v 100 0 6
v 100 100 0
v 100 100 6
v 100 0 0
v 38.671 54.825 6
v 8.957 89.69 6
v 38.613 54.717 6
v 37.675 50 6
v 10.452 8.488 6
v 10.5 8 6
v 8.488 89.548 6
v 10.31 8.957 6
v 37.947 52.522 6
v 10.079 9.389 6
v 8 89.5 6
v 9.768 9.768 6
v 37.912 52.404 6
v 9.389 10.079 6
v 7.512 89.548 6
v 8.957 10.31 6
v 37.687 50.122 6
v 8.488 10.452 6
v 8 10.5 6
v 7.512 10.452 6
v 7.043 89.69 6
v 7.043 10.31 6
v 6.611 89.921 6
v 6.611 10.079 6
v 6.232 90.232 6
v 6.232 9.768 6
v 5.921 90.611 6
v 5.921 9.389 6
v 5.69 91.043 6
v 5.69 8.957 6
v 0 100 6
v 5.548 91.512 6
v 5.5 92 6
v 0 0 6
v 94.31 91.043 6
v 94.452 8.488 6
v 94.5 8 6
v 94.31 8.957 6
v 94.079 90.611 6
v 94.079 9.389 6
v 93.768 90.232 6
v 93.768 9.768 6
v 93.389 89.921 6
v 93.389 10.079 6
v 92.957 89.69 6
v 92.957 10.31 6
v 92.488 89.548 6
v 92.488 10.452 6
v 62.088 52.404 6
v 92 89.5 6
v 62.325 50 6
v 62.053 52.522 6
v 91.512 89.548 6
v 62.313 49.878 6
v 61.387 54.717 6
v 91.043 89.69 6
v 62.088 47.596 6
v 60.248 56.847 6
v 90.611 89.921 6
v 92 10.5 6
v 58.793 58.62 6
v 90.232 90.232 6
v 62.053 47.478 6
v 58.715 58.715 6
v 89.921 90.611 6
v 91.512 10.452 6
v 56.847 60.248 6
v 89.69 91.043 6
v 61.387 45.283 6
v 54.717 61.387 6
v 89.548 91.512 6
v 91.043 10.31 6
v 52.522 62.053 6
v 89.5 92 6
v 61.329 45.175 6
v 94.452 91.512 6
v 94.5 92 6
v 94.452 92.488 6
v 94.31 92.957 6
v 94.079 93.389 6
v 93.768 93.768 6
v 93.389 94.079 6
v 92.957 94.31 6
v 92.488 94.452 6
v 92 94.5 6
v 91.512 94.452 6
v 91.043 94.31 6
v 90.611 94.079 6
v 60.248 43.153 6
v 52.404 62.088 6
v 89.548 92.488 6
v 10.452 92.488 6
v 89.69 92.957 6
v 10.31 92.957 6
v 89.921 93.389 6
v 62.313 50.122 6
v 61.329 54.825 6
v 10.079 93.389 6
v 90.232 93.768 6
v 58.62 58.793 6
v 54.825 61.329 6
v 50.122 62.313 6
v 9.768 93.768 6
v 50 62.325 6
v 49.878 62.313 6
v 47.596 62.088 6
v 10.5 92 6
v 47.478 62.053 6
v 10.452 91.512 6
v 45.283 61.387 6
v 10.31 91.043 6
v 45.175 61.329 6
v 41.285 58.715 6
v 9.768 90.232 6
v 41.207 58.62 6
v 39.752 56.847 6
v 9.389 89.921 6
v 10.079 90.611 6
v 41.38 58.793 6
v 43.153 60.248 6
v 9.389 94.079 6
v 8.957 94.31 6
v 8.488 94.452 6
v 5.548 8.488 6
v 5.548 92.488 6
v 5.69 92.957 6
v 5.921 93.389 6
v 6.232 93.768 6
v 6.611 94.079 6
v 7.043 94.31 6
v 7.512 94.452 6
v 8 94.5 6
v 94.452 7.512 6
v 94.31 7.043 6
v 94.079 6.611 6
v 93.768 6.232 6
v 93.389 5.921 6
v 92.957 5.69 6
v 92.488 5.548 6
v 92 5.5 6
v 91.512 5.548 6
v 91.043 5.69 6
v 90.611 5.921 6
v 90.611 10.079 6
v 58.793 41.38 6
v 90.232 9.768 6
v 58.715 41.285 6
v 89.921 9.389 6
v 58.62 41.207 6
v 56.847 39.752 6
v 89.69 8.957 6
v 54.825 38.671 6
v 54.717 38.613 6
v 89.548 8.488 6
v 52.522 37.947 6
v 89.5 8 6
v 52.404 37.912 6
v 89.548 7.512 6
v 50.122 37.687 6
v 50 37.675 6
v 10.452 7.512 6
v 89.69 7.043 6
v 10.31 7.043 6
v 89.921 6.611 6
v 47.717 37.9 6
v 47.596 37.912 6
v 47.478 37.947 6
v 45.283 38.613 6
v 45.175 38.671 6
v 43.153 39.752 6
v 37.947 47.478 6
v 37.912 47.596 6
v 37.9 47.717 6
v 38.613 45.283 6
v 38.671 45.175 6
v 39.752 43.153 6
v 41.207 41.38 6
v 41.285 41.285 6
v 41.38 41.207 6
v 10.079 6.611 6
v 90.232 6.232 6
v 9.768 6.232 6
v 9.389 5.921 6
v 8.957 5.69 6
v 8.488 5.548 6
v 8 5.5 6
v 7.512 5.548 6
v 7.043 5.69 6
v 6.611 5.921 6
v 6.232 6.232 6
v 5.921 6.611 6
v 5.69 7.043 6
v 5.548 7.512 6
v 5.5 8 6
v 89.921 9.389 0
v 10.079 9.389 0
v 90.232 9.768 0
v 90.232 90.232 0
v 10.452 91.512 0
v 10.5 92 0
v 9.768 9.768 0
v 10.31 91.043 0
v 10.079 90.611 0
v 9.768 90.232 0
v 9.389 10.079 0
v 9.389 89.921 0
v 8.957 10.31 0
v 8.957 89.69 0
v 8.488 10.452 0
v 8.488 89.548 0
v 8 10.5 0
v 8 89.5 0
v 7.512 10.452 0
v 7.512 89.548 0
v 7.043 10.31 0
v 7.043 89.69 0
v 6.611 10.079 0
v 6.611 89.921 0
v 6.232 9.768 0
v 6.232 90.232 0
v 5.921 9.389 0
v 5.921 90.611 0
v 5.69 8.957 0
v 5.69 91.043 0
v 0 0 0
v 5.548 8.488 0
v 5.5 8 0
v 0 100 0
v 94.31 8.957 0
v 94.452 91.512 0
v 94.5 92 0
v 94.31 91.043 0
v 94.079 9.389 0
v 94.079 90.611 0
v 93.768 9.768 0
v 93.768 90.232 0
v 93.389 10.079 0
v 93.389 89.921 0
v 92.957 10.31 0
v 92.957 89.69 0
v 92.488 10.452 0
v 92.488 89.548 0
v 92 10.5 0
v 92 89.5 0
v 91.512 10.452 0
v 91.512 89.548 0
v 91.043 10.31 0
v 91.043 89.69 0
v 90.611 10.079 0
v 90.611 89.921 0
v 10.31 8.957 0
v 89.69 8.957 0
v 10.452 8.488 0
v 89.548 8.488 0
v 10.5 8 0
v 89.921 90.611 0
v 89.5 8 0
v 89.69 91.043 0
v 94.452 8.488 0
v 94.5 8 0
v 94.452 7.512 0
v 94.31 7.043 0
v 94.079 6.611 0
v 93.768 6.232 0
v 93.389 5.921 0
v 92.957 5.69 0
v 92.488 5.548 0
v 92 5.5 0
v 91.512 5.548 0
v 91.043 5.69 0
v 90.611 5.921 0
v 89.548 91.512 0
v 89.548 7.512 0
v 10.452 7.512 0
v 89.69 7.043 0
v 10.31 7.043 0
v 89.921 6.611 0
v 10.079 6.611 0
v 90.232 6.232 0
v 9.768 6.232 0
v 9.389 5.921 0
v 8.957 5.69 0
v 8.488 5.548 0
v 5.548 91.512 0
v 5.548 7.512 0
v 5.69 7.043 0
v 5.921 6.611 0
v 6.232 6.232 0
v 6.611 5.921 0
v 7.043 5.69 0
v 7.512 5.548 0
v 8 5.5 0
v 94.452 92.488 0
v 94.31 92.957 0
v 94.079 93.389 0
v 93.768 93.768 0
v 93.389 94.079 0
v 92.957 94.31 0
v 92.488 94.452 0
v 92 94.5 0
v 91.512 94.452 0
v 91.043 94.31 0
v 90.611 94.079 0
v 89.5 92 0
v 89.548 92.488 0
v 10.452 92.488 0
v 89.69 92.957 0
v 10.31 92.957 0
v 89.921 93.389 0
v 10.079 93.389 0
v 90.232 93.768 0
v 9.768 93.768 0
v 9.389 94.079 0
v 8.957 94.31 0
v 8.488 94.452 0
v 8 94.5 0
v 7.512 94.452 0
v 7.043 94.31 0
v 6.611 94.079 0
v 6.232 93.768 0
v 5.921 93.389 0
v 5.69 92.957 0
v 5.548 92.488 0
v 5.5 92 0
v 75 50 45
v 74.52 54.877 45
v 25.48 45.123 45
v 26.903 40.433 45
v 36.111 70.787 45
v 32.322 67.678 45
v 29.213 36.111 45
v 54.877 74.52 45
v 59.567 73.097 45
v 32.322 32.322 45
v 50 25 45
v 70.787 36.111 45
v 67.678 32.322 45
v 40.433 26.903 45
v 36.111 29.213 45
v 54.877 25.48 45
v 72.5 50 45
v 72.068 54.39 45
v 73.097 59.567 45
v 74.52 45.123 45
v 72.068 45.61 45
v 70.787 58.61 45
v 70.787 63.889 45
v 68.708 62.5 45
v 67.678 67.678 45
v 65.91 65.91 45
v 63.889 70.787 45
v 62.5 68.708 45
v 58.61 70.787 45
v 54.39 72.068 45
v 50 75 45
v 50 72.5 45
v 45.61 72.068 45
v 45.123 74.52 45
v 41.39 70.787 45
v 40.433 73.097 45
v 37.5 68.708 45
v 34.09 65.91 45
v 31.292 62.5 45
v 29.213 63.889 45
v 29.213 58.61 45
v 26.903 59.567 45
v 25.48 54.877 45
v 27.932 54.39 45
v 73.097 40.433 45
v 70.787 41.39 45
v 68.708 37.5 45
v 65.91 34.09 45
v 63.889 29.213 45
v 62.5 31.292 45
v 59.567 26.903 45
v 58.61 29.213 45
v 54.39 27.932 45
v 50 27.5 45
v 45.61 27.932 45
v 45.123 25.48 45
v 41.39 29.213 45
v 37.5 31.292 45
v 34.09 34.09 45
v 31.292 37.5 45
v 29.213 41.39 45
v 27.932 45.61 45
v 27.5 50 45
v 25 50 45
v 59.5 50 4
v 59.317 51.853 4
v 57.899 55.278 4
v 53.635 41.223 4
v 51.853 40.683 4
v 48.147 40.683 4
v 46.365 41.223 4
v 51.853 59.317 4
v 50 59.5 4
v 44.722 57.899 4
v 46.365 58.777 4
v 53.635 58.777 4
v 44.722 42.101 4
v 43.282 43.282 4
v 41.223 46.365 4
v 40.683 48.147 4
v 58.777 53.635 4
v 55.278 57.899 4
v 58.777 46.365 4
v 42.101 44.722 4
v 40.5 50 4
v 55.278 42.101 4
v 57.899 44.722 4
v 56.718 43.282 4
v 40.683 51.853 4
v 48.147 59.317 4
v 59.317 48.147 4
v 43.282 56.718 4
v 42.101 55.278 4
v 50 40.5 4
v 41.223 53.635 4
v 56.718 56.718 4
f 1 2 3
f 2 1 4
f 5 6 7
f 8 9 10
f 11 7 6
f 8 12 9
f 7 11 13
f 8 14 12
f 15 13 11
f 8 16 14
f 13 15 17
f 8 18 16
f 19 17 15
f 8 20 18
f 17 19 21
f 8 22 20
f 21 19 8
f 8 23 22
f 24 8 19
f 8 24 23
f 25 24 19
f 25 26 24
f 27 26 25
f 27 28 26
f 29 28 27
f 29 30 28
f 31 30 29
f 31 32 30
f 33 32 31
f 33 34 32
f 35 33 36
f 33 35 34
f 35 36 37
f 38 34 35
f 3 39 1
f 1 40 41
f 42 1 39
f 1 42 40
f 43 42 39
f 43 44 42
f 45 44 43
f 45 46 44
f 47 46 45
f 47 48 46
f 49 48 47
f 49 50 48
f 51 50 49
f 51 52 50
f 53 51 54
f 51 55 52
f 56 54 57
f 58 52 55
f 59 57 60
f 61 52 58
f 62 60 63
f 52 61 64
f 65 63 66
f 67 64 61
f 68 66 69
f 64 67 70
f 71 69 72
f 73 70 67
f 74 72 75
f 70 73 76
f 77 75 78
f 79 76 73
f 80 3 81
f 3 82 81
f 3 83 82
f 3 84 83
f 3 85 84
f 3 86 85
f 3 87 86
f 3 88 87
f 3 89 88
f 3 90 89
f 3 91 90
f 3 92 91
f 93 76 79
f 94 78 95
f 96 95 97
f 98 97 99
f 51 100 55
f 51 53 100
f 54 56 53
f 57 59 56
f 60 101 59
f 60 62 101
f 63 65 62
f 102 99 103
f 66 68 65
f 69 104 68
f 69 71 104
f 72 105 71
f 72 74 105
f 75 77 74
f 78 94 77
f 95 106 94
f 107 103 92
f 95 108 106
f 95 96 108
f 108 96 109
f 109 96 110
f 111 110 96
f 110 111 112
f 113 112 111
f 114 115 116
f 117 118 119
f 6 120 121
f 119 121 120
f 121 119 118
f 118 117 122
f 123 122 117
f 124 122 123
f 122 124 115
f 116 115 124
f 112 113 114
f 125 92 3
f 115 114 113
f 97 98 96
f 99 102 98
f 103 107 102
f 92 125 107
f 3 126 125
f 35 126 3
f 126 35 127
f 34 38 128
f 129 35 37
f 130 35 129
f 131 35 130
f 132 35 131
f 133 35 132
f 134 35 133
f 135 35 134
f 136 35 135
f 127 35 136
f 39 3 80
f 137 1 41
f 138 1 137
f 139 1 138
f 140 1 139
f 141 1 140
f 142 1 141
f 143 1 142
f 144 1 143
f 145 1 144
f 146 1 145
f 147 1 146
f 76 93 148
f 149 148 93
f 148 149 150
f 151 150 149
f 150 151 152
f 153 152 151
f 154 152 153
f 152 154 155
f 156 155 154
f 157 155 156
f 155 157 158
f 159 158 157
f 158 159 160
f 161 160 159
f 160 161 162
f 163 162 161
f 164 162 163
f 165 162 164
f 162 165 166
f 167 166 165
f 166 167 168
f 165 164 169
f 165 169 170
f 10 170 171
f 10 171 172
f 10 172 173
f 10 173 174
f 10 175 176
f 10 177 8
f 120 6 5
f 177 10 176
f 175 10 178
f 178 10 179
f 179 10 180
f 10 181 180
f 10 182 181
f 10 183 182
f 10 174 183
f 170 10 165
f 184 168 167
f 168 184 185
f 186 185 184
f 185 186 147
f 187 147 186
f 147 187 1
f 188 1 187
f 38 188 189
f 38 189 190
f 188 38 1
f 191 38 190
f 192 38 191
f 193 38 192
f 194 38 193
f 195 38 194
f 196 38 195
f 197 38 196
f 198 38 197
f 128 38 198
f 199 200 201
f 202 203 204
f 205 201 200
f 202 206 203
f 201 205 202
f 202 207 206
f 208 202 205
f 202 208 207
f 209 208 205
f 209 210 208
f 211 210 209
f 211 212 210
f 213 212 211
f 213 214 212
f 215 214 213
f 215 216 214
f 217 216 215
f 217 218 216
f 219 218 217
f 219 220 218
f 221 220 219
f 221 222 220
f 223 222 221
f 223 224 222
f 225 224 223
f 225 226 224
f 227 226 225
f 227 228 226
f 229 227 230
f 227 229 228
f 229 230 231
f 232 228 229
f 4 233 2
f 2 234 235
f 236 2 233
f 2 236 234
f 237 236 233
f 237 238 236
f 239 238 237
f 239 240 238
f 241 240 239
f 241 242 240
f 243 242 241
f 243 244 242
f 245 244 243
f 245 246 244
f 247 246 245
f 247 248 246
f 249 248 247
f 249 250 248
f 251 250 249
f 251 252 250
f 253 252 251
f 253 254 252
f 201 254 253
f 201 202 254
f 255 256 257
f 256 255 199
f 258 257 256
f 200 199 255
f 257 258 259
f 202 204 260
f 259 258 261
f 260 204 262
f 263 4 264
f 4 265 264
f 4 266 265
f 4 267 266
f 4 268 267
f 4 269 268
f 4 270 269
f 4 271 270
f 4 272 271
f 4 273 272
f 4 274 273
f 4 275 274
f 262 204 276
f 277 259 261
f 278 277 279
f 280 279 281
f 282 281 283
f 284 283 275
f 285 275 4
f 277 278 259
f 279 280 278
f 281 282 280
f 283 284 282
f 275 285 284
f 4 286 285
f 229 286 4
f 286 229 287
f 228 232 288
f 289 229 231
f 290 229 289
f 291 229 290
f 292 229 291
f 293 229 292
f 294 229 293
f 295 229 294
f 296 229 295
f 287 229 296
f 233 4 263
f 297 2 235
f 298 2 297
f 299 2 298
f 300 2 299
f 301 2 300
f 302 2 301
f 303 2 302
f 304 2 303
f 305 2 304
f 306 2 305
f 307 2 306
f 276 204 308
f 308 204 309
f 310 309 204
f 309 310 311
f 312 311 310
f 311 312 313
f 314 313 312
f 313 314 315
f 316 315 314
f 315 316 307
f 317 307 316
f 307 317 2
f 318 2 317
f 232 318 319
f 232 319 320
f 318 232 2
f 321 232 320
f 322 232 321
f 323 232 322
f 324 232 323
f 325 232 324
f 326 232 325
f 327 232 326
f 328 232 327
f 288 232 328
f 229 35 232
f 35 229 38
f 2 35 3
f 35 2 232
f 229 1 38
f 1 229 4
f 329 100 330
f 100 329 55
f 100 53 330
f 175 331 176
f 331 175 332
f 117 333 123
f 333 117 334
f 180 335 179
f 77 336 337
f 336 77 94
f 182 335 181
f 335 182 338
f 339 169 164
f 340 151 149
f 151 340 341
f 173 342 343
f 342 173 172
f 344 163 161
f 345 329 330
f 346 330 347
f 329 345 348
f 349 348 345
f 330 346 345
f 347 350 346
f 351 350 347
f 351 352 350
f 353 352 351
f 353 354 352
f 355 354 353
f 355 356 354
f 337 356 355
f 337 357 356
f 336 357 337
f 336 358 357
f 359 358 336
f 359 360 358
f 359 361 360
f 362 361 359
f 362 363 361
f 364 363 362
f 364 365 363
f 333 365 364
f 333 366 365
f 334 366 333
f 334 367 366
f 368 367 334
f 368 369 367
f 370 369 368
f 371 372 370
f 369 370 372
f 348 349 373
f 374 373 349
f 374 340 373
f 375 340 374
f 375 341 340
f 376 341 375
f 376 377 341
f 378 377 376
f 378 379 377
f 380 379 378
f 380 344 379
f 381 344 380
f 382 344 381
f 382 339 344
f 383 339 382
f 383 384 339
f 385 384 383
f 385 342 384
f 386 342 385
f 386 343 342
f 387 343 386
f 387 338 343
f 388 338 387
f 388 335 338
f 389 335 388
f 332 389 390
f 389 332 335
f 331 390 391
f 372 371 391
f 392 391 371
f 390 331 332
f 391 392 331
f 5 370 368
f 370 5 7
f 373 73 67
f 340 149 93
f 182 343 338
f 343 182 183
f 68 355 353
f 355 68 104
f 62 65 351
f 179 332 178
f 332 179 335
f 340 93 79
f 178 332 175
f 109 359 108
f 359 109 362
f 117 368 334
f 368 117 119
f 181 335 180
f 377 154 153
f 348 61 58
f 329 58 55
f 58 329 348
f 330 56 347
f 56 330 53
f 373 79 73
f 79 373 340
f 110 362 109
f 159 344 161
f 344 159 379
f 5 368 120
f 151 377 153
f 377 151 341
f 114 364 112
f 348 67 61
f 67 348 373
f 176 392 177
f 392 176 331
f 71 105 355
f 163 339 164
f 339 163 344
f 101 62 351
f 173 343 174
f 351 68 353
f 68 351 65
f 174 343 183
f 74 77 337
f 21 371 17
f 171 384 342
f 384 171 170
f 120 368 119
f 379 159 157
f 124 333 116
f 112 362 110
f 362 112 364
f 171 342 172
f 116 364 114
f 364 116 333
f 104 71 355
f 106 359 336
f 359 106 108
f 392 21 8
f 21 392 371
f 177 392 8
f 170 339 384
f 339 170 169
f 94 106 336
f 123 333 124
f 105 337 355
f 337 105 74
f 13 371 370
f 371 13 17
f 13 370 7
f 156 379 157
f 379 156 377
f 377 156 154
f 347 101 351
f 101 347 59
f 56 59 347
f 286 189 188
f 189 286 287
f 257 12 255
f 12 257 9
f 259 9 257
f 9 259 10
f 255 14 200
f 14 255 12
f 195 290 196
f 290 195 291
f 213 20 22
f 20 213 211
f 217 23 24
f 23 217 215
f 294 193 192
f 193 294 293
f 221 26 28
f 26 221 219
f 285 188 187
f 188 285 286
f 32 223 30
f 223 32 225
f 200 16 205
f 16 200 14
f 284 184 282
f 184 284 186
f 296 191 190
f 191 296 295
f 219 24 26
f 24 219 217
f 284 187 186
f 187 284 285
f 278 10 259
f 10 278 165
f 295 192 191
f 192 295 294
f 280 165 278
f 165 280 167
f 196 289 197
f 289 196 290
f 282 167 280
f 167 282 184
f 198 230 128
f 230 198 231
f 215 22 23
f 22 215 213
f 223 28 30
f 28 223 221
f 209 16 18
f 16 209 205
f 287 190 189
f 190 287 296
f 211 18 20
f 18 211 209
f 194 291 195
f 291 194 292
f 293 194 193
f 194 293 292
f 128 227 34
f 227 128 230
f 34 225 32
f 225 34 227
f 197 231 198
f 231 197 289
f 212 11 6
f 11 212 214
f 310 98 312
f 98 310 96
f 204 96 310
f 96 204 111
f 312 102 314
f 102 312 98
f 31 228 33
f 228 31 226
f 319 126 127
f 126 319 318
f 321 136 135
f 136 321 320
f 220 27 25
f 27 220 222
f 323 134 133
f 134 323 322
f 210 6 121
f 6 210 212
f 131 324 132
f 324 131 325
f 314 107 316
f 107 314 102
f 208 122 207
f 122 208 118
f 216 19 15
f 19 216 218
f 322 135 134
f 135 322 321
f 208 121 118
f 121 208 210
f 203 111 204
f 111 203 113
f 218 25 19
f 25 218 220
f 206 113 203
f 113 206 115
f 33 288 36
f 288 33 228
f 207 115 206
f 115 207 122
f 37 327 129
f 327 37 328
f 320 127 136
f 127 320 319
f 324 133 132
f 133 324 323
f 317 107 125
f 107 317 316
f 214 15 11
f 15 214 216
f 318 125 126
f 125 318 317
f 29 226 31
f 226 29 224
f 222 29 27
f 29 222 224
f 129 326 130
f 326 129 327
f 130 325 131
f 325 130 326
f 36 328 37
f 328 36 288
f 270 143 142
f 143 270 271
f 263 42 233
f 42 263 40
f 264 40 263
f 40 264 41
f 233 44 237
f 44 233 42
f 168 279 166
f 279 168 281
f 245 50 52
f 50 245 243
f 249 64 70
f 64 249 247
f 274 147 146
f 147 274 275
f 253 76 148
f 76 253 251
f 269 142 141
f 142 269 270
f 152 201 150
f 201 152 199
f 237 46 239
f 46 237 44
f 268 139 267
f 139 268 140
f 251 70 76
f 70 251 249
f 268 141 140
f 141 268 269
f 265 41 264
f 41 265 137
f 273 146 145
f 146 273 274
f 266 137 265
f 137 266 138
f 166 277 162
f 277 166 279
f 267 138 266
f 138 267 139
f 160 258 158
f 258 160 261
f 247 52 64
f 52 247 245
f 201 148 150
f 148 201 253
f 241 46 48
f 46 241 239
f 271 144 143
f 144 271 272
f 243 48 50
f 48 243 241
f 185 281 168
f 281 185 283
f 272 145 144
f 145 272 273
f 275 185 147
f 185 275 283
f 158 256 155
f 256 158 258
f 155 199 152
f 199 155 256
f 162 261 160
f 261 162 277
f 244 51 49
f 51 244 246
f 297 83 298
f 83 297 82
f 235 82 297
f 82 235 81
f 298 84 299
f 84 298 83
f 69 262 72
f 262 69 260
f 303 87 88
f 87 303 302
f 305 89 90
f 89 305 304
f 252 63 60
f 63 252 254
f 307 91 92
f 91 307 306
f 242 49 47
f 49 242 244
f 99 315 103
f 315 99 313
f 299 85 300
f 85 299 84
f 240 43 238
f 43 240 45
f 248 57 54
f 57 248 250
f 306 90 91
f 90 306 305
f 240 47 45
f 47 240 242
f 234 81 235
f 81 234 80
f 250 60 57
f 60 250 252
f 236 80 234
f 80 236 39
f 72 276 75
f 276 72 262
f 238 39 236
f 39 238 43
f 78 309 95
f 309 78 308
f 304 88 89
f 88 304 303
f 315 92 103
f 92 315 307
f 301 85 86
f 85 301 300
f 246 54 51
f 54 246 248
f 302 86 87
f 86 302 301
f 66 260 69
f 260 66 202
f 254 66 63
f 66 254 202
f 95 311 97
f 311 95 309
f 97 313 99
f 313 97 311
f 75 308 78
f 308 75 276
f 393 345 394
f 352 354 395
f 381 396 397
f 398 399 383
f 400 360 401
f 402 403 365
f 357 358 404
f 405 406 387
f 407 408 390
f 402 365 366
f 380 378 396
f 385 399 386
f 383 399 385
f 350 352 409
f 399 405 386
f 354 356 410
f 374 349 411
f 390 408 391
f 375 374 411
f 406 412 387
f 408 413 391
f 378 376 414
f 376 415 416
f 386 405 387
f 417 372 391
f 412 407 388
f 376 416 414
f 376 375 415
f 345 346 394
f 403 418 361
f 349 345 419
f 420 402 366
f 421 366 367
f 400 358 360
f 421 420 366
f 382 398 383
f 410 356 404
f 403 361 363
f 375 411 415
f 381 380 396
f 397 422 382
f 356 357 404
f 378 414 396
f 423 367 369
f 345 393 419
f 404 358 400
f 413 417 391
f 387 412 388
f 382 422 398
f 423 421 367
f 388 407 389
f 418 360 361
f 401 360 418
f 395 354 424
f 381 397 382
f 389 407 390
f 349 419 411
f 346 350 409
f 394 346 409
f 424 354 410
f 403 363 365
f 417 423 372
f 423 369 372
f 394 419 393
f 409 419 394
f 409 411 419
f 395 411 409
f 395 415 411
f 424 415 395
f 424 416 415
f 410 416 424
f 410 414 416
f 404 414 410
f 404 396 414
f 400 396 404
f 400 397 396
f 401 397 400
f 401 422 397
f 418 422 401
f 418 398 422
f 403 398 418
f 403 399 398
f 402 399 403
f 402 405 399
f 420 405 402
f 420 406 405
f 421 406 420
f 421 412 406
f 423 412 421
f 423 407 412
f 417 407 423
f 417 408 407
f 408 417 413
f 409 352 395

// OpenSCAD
$fn = 32;

// ----------------------------------------------------------------------
// Hopper: flanged with square flange
// ----------------------------------------------------------------------

// --- parameters (mm) ---
fl = 100;                 // flange side, X and Y
fl_t = 6;                 // flange thickness
cone_h = 40;              // cone height above the flange
top_d = 50;               // cone mouth diameter
bot_d = 24;               // cone spout diameter
wall = 2.5;               // cone wall thickness
hole_r = 2.5;             // flange hole radius
hole_in = 8;              // hole inset from the corners
fit_tol = 0.1;            // tolerance for press fits, mm
free_tol = 0.5;           // tolerance for clearance fits, mm

bore_d = bot_d - 2 * wall;  // spout bore diameter
total_h = fl_t + cone_h - 1;  // overall height

difference() {
  union() {
    cube([fl, fl, fl_t]);
    translate([fl / 2, fl / 2, fl_t - 1])
      cylinder(h = cone_h, d1 = bot_d, d2 = top_d);
  }
  translate([fl / 2, fl / 2, fl_t - 2])
    cylinder(h = cone_h + 1, d1 = bore_d, d2 = top_d - 2 * wall);
  for (sx = [0, 1], sy = [0, 1])
    translate([sx ? fl - hole_in : hole_in,
               sy ? fl - hole_in : hole_in, -1])
      cylinder(r = hole_r, h = fl_t + 2);
}
